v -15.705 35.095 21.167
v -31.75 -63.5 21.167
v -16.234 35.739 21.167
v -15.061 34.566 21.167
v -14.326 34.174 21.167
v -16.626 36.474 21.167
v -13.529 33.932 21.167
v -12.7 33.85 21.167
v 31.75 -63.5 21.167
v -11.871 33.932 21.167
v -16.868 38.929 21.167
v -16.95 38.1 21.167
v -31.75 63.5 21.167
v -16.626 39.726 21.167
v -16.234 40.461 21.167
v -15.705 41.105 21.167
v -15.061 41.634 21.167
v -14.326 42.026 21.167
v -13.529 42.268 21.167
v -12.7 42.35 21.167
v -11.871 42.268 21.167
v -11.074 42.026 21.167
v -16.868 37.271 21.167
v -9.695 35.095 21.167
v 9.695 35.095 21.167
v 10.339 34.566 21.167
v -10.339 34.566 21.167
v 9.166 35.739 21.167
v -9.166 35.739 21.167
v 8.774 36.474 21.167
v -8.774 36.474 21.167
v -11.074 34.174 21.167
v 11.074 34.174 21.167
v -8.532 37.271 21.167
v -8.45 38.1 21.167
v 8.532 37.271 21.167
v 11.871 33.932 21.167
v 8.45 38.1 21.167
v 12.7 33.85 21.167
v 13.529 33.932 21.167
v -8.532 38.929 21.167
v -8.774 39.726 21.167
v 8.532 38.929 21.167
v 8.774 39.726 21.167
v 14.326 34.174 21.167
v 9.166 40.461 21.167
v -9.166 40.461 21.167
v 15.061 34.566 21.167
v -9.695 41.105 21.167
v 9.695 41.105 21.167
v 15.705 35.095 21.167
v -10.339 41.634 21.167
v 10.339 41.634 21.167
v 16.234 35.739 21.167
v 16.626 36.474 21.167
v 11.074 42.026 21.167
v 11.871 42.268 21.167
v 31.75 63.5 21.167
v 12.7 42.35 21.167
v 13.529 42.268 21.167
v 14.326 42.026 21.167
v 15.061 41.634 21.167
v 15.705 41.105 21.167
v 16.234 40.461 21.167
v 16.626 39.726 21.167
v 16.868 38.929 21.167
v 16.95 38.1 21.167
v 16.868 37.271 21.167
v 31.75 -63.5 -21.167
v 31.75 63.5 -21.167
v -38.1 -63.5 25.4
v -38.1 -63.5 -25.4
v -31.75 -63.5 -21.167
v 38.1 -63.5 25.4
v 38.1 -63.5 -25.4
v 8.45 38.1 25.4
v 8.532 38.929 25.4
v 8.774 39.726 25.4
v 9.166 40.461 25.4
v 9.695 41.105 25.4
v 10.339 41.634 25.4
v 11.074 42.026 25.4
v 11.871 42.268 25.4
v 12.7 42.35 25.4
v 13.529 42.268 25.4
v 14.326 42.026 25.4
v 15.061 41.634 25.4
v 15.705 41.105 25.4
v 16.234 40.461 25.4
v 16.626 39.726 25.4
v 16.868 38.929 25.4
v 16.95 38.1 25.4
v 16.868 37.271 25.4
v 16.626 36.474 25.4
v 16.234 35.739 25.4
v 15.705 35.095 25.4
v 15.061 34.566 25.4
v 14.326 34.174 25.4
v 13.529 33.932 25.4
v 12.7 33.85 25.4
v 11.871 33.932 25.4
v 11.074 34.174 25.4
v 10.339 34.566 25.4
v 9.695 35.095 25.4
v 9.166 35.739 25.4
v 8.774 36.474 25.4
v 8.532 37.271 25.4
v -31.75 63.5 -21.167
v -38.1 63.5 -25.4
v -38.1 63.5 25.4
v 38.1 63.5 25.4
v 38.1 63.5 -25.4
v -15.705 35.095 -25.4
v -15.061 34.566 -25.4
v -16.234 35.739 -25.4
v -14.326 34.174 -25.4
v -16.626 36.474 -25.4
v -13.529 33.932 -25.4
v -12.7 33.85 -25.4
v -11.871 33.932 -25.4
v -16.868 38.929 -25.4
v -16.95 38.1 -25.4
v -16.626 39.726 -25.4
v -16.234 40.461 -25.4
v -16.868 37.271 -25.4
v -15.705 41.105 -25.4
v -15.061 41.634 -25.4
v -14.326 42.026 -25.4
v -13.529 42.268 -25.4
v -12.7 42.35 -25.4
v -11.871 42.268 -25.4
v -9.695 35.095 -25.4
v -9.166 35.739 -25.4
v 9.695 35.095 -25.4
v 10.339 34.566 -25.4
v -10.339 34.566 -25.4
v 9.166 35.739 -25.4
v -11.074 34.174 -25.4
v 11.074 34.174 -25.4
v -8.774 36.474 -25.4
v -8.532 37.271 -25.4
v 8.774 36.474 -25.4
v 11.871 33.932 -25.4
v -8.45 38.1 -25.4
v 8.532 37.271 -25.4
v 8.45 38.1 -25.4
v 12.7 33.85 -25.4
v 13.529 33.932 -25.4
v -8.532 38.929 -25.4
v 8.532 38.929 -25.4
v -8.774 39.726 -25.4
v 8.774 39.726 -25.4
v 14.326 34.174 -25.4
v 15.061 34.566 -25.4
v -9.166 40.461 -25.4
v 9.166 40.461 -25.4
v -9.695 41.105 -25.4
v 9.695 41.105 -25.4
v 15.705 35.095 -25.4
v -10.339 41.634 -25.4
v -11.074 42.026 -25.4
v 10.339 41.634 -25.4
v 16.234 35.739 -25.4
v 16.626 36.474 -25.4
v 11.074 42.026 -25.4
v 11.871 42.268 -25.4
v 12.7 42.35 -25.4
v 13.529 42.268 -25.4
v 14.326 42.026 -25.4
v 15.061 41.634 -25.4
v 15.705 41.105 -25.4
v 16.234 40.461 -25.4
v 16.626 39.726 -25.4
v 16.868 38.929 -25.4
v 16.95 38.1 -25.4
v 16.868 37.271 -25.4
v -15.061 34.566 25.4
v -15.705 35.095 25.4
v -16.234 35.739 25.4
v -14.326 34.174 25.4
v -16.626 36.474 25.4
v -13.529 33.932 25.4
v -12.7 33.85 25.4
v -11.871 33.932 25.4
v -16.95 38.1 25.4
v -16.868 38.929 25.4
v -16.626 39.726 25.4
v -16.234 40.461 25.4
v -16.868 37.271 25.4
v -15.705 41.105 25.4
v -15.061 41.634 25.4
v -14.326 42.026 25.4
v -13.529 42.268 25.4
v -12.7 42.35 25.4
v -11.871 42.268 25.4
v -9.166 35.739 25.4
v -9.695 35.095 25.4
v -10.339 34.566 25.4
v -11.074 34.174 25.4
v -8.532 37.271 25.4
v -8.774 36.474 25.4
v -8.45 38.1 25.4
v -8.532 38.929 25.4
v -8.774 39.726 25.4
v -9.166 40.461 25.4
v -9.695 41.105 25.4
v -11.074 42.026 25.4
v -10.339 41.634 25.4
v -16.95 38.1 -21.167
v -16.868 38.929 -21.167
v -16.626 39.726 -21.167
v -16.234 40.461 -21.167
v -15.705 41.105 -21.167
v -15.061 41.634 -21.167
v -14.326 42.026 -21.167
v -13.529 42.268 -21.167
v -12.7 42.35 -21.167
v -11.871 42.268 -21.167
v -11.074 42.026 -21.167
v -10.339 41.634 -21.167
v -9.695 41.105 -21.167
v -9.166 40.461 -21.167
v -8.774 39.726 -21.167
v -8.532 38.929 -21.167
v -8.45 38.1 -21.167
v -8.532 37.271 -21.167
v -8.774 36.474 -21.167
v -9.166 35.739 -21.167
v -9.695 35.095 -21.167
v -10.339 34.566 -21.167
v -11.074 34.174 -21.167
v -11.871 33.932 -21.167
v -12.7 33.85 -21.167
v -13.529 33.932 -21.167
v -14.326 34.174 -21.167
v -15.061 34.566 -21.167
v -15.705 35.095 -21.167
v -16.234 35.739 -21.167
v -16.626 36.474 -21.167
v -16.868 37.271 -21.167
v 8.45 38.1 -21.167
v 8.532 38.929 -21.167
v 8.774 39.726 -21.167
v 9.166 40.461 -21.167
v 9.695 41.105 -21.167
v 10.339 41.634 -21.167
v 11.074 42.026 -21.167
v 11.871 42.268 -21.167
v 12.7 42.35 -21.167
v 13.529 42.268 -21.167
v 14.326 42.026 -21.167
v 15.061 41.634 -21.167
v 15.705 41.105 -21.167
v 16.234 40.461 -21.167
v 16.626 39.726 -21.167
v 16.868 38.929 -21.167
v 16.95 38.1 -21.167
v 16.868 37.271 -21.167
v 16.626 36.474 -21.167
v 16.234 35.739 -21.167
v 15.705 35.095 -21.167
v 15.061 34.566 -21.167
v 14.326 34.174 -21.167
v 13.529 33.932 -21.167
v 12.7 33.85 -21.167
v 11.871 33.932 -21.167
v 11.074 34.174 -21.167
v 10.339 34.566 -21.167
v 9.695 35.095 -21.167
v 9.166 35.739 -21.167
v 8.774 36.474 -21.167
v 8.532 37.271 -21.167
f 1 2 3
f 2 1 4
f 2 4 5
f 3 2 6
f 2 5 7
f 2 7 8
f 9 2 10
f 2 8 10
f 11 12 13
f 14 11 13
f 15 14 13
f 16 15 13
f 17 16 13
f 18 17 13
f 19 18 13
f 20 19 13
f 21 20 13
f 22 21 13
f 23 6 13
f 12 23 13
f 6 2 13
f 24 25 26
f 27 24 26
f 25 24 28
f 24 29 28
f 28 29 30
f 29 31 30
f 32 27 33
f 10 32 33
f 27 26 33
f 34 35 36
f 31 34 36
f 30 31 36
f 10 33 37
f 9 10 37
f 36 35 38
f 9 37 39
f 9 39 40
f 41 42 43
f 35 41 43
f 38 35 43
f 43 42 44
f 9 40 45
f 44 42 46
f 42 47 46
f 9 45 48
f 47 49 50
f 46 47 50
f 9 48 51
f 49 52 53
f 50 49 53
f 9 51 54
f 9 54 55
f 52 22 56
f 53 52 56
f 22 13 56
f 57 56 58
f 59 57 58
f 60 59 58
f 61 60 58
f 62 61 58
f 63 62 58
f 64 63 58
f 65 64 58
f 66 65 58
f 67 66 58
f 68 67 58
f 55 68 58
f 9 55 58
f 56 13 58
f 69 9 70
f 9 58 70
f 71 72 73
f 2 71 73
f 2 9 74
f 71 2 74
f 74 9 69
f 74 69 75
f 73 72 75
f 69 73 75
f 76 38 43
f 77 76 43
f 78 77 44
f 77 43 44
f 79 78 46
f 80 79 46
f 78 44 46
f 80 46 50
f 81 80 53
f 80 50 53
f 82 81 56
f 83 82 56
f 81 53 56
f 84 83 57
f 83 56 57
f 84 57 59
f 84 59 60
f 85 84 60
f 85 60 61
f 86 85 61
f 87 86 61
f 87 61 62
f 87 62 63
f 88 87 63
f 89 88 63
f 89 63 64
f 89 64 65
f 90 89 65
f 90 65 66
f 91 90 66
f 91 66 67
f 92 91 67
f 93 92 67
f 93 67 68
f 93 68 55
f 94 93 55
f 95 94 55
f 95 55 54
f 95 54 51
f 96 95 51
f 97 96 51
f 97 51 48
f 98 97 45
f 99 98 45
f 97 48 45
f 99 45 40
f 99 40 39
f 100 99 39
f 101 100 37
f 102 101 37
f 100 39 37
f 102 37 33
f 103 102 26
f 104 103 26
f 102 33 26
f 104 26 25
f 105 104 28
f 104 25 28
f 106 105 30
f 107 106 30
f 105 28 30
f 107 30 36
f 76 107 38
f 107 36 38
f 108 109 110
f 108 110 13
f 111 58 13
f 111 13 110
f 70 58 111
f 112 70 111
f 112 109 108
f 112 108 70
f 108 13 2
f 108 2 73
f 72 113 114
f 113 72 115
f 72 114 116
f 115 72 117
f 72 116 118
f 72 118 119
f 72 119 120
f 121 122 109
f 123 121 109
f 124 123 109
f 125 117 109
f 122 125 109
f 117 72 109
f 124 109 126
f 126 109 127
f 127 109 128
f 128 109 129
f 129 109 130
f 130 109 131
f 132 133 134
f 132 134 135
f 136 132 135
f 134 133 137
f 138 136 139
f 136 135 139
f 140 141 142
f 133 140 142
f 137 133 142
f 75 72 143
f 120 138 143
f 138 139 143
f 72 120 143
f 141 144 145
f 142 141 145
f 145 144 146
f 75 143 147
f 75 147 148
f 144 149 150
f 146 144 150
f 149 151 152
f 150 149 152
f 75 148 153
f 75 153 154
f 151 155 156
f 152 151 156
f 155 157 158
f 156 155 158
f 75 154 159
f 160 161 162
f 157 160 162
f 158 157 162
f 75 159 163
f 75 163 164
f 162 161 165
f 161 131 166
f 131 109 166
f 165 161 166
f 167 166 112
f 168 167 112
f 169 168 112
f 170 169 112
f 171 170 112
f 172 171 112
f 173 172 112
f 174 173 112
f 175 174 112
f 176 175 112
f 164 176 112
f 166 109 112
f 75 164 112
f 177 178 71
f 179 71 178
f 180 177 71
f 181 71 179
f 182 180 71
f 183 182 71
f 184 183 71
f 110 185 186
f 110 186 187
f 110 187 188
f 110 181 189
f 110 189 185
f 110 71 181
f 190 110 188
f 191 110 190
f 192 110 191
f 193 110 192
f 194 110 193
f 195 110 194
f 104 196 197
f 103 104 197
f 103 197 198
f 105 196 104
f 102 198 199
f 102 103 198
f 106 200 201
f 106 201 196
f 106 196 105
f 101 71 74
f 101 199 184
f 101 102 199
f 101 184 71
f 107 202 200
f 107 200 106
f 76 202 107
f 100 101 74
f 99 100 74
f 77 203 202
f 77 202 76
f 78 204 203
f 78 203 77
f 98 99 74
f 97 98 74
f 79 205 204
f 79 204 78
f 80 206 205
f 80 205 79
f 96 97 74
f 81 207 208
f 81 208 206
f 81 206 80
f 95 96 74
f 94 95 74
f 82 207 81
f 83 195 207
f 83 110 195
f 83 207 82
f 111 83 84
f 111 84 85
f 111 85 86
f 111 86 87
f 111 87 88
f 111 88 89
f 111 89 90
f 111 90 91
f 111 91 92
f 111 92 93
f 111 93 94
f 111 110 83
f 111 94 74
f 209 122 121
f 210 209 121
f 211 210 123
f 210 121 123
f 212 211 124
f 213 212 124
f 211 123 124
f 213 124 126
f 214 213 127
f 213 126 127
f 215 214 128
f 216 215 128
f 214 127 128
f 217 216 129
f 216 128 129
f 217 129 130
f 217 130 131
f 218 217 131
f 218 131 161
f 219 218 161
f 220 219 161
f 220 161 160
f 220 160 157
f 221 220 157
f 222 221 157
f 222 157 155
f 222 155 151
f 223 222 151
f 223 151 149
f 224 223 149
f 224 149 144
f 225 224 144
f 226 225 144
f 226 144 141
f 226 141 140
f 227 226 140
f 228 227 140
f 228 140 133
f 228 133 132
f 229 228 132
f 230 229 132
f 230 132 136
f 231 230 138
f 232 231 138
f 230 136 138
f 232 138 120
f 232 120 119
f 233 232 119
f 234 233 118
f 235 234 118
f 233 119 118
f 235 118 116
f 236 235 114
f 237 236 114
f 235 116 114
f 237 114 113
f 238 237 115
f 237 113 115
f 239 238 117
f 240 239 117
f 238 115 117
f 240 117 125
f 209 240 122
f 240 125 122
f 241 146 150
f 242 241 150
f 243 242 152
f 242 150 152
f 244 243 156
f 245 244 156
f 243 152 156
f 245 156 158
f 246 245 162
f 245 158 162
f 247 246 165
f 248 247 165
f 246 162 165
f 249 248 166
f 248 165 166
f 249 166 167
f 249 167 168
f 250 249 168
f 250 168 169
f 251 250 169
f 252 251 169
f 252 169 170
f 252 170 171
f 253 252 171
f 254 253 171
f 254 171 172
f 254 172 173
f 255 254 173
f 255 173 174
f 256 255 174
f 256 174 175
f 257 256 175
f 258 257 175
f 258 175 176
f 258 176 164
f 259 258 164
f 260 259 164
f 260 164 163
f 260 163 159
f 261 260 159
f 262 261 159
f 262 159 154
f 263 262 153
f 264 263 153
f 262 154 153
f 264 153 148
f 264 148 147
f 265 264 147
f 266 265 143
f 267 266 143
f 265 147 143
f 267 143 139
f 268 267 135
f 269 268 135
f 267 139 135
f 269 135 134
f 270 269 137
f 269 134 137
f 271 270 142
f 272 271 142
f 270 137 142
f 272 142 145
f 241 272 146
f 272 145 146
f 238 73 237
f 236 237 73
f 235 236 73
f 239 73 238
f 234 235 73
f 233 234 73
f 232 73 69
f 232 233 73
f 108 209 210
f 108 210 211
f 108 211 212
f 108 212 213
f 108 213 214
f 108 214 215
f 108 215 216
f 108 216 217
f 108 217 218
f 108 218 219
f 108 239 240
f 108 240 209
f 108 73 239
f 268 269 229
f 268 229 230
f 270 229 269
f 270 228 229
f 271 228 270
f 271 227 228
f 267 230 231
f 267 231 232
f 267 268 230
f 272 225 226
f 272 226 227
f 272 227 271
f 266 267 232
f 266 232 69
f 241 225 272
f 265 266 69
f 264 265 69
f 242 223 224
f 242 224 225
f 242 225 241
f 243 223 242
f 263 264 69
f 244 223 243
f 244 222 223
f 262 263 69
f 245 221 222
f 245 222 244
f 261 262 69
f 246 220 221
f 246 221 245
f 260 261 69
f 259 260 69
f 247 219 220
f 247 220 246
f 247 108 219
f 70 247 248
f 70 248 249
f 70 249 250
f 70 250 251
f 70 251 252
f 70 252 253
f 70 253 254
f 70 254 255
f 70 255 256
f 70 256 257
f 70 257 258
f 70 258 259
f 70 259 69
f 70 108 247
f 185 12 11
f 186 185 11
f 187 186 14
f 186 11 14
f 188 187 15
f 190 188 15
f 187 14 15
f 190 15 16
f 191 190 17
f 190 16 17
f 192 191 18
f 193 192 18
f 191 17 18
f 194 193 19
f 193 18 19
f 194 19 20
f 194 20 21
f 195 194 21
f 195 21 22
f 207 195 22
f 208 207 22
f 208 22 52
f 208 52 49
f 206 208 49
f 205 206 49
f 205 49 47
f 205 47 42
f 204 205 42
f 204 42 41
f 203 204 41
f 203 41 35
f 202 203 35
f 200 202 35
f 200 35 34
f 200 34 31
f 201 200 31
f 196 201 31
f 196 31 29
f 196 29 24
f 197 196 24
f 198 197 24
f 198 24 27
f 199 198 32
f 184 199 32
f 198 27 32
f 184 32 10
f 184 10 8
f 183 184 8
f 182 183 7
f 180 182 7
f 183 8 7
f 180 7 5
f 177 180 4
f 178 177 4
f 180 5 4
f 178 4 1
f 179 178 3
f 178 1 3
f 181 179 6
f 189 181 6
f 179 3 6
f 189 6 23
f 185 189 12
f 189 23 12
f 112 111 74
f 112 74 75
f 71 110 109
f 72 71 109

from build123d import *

# Parameters (mm, degrees)
SKETCH1_W                    = 76.2
SKETCH1_H                    = 50.8
SKETCH1_W_2                  = 63.5
SKETCH1_H_2                  = 42.333333334
BOSS_EXTRUDE1_DEPTH          = 63.5
TAP_DRILL_FOR_M10X1_5_TAP1_D = 8.5


with BuildPart() as part:
    # Sketch1 → Boss-Extrude1 (new body, symmetric)
    with BuildSketch(Plane(origin=(0, 0, 0), x_dir=(1, 0, 0), z_dir=(0, 1, 0))):
        Rectangle(SKETCH1_W, SKETCH1_H)
        Rectangle(SKETCH1_W_2, SKETCH1_H_2, mode=Mode.SUBTRACT)
    extrude(amount=BOSS_EXTRUDE1_DEPTH, both=True)

    # Tap Drill for M10x1.5 Tap1 (through all)
    with Locations(Plane.XY.offset(25.4)):
        with Locations((-12.7, 38.1), (12.7, 38.1)):
            Hole(TAP_DRILL_FOR_M10X1_5_TAP1_D / 2)


solid = part.part
